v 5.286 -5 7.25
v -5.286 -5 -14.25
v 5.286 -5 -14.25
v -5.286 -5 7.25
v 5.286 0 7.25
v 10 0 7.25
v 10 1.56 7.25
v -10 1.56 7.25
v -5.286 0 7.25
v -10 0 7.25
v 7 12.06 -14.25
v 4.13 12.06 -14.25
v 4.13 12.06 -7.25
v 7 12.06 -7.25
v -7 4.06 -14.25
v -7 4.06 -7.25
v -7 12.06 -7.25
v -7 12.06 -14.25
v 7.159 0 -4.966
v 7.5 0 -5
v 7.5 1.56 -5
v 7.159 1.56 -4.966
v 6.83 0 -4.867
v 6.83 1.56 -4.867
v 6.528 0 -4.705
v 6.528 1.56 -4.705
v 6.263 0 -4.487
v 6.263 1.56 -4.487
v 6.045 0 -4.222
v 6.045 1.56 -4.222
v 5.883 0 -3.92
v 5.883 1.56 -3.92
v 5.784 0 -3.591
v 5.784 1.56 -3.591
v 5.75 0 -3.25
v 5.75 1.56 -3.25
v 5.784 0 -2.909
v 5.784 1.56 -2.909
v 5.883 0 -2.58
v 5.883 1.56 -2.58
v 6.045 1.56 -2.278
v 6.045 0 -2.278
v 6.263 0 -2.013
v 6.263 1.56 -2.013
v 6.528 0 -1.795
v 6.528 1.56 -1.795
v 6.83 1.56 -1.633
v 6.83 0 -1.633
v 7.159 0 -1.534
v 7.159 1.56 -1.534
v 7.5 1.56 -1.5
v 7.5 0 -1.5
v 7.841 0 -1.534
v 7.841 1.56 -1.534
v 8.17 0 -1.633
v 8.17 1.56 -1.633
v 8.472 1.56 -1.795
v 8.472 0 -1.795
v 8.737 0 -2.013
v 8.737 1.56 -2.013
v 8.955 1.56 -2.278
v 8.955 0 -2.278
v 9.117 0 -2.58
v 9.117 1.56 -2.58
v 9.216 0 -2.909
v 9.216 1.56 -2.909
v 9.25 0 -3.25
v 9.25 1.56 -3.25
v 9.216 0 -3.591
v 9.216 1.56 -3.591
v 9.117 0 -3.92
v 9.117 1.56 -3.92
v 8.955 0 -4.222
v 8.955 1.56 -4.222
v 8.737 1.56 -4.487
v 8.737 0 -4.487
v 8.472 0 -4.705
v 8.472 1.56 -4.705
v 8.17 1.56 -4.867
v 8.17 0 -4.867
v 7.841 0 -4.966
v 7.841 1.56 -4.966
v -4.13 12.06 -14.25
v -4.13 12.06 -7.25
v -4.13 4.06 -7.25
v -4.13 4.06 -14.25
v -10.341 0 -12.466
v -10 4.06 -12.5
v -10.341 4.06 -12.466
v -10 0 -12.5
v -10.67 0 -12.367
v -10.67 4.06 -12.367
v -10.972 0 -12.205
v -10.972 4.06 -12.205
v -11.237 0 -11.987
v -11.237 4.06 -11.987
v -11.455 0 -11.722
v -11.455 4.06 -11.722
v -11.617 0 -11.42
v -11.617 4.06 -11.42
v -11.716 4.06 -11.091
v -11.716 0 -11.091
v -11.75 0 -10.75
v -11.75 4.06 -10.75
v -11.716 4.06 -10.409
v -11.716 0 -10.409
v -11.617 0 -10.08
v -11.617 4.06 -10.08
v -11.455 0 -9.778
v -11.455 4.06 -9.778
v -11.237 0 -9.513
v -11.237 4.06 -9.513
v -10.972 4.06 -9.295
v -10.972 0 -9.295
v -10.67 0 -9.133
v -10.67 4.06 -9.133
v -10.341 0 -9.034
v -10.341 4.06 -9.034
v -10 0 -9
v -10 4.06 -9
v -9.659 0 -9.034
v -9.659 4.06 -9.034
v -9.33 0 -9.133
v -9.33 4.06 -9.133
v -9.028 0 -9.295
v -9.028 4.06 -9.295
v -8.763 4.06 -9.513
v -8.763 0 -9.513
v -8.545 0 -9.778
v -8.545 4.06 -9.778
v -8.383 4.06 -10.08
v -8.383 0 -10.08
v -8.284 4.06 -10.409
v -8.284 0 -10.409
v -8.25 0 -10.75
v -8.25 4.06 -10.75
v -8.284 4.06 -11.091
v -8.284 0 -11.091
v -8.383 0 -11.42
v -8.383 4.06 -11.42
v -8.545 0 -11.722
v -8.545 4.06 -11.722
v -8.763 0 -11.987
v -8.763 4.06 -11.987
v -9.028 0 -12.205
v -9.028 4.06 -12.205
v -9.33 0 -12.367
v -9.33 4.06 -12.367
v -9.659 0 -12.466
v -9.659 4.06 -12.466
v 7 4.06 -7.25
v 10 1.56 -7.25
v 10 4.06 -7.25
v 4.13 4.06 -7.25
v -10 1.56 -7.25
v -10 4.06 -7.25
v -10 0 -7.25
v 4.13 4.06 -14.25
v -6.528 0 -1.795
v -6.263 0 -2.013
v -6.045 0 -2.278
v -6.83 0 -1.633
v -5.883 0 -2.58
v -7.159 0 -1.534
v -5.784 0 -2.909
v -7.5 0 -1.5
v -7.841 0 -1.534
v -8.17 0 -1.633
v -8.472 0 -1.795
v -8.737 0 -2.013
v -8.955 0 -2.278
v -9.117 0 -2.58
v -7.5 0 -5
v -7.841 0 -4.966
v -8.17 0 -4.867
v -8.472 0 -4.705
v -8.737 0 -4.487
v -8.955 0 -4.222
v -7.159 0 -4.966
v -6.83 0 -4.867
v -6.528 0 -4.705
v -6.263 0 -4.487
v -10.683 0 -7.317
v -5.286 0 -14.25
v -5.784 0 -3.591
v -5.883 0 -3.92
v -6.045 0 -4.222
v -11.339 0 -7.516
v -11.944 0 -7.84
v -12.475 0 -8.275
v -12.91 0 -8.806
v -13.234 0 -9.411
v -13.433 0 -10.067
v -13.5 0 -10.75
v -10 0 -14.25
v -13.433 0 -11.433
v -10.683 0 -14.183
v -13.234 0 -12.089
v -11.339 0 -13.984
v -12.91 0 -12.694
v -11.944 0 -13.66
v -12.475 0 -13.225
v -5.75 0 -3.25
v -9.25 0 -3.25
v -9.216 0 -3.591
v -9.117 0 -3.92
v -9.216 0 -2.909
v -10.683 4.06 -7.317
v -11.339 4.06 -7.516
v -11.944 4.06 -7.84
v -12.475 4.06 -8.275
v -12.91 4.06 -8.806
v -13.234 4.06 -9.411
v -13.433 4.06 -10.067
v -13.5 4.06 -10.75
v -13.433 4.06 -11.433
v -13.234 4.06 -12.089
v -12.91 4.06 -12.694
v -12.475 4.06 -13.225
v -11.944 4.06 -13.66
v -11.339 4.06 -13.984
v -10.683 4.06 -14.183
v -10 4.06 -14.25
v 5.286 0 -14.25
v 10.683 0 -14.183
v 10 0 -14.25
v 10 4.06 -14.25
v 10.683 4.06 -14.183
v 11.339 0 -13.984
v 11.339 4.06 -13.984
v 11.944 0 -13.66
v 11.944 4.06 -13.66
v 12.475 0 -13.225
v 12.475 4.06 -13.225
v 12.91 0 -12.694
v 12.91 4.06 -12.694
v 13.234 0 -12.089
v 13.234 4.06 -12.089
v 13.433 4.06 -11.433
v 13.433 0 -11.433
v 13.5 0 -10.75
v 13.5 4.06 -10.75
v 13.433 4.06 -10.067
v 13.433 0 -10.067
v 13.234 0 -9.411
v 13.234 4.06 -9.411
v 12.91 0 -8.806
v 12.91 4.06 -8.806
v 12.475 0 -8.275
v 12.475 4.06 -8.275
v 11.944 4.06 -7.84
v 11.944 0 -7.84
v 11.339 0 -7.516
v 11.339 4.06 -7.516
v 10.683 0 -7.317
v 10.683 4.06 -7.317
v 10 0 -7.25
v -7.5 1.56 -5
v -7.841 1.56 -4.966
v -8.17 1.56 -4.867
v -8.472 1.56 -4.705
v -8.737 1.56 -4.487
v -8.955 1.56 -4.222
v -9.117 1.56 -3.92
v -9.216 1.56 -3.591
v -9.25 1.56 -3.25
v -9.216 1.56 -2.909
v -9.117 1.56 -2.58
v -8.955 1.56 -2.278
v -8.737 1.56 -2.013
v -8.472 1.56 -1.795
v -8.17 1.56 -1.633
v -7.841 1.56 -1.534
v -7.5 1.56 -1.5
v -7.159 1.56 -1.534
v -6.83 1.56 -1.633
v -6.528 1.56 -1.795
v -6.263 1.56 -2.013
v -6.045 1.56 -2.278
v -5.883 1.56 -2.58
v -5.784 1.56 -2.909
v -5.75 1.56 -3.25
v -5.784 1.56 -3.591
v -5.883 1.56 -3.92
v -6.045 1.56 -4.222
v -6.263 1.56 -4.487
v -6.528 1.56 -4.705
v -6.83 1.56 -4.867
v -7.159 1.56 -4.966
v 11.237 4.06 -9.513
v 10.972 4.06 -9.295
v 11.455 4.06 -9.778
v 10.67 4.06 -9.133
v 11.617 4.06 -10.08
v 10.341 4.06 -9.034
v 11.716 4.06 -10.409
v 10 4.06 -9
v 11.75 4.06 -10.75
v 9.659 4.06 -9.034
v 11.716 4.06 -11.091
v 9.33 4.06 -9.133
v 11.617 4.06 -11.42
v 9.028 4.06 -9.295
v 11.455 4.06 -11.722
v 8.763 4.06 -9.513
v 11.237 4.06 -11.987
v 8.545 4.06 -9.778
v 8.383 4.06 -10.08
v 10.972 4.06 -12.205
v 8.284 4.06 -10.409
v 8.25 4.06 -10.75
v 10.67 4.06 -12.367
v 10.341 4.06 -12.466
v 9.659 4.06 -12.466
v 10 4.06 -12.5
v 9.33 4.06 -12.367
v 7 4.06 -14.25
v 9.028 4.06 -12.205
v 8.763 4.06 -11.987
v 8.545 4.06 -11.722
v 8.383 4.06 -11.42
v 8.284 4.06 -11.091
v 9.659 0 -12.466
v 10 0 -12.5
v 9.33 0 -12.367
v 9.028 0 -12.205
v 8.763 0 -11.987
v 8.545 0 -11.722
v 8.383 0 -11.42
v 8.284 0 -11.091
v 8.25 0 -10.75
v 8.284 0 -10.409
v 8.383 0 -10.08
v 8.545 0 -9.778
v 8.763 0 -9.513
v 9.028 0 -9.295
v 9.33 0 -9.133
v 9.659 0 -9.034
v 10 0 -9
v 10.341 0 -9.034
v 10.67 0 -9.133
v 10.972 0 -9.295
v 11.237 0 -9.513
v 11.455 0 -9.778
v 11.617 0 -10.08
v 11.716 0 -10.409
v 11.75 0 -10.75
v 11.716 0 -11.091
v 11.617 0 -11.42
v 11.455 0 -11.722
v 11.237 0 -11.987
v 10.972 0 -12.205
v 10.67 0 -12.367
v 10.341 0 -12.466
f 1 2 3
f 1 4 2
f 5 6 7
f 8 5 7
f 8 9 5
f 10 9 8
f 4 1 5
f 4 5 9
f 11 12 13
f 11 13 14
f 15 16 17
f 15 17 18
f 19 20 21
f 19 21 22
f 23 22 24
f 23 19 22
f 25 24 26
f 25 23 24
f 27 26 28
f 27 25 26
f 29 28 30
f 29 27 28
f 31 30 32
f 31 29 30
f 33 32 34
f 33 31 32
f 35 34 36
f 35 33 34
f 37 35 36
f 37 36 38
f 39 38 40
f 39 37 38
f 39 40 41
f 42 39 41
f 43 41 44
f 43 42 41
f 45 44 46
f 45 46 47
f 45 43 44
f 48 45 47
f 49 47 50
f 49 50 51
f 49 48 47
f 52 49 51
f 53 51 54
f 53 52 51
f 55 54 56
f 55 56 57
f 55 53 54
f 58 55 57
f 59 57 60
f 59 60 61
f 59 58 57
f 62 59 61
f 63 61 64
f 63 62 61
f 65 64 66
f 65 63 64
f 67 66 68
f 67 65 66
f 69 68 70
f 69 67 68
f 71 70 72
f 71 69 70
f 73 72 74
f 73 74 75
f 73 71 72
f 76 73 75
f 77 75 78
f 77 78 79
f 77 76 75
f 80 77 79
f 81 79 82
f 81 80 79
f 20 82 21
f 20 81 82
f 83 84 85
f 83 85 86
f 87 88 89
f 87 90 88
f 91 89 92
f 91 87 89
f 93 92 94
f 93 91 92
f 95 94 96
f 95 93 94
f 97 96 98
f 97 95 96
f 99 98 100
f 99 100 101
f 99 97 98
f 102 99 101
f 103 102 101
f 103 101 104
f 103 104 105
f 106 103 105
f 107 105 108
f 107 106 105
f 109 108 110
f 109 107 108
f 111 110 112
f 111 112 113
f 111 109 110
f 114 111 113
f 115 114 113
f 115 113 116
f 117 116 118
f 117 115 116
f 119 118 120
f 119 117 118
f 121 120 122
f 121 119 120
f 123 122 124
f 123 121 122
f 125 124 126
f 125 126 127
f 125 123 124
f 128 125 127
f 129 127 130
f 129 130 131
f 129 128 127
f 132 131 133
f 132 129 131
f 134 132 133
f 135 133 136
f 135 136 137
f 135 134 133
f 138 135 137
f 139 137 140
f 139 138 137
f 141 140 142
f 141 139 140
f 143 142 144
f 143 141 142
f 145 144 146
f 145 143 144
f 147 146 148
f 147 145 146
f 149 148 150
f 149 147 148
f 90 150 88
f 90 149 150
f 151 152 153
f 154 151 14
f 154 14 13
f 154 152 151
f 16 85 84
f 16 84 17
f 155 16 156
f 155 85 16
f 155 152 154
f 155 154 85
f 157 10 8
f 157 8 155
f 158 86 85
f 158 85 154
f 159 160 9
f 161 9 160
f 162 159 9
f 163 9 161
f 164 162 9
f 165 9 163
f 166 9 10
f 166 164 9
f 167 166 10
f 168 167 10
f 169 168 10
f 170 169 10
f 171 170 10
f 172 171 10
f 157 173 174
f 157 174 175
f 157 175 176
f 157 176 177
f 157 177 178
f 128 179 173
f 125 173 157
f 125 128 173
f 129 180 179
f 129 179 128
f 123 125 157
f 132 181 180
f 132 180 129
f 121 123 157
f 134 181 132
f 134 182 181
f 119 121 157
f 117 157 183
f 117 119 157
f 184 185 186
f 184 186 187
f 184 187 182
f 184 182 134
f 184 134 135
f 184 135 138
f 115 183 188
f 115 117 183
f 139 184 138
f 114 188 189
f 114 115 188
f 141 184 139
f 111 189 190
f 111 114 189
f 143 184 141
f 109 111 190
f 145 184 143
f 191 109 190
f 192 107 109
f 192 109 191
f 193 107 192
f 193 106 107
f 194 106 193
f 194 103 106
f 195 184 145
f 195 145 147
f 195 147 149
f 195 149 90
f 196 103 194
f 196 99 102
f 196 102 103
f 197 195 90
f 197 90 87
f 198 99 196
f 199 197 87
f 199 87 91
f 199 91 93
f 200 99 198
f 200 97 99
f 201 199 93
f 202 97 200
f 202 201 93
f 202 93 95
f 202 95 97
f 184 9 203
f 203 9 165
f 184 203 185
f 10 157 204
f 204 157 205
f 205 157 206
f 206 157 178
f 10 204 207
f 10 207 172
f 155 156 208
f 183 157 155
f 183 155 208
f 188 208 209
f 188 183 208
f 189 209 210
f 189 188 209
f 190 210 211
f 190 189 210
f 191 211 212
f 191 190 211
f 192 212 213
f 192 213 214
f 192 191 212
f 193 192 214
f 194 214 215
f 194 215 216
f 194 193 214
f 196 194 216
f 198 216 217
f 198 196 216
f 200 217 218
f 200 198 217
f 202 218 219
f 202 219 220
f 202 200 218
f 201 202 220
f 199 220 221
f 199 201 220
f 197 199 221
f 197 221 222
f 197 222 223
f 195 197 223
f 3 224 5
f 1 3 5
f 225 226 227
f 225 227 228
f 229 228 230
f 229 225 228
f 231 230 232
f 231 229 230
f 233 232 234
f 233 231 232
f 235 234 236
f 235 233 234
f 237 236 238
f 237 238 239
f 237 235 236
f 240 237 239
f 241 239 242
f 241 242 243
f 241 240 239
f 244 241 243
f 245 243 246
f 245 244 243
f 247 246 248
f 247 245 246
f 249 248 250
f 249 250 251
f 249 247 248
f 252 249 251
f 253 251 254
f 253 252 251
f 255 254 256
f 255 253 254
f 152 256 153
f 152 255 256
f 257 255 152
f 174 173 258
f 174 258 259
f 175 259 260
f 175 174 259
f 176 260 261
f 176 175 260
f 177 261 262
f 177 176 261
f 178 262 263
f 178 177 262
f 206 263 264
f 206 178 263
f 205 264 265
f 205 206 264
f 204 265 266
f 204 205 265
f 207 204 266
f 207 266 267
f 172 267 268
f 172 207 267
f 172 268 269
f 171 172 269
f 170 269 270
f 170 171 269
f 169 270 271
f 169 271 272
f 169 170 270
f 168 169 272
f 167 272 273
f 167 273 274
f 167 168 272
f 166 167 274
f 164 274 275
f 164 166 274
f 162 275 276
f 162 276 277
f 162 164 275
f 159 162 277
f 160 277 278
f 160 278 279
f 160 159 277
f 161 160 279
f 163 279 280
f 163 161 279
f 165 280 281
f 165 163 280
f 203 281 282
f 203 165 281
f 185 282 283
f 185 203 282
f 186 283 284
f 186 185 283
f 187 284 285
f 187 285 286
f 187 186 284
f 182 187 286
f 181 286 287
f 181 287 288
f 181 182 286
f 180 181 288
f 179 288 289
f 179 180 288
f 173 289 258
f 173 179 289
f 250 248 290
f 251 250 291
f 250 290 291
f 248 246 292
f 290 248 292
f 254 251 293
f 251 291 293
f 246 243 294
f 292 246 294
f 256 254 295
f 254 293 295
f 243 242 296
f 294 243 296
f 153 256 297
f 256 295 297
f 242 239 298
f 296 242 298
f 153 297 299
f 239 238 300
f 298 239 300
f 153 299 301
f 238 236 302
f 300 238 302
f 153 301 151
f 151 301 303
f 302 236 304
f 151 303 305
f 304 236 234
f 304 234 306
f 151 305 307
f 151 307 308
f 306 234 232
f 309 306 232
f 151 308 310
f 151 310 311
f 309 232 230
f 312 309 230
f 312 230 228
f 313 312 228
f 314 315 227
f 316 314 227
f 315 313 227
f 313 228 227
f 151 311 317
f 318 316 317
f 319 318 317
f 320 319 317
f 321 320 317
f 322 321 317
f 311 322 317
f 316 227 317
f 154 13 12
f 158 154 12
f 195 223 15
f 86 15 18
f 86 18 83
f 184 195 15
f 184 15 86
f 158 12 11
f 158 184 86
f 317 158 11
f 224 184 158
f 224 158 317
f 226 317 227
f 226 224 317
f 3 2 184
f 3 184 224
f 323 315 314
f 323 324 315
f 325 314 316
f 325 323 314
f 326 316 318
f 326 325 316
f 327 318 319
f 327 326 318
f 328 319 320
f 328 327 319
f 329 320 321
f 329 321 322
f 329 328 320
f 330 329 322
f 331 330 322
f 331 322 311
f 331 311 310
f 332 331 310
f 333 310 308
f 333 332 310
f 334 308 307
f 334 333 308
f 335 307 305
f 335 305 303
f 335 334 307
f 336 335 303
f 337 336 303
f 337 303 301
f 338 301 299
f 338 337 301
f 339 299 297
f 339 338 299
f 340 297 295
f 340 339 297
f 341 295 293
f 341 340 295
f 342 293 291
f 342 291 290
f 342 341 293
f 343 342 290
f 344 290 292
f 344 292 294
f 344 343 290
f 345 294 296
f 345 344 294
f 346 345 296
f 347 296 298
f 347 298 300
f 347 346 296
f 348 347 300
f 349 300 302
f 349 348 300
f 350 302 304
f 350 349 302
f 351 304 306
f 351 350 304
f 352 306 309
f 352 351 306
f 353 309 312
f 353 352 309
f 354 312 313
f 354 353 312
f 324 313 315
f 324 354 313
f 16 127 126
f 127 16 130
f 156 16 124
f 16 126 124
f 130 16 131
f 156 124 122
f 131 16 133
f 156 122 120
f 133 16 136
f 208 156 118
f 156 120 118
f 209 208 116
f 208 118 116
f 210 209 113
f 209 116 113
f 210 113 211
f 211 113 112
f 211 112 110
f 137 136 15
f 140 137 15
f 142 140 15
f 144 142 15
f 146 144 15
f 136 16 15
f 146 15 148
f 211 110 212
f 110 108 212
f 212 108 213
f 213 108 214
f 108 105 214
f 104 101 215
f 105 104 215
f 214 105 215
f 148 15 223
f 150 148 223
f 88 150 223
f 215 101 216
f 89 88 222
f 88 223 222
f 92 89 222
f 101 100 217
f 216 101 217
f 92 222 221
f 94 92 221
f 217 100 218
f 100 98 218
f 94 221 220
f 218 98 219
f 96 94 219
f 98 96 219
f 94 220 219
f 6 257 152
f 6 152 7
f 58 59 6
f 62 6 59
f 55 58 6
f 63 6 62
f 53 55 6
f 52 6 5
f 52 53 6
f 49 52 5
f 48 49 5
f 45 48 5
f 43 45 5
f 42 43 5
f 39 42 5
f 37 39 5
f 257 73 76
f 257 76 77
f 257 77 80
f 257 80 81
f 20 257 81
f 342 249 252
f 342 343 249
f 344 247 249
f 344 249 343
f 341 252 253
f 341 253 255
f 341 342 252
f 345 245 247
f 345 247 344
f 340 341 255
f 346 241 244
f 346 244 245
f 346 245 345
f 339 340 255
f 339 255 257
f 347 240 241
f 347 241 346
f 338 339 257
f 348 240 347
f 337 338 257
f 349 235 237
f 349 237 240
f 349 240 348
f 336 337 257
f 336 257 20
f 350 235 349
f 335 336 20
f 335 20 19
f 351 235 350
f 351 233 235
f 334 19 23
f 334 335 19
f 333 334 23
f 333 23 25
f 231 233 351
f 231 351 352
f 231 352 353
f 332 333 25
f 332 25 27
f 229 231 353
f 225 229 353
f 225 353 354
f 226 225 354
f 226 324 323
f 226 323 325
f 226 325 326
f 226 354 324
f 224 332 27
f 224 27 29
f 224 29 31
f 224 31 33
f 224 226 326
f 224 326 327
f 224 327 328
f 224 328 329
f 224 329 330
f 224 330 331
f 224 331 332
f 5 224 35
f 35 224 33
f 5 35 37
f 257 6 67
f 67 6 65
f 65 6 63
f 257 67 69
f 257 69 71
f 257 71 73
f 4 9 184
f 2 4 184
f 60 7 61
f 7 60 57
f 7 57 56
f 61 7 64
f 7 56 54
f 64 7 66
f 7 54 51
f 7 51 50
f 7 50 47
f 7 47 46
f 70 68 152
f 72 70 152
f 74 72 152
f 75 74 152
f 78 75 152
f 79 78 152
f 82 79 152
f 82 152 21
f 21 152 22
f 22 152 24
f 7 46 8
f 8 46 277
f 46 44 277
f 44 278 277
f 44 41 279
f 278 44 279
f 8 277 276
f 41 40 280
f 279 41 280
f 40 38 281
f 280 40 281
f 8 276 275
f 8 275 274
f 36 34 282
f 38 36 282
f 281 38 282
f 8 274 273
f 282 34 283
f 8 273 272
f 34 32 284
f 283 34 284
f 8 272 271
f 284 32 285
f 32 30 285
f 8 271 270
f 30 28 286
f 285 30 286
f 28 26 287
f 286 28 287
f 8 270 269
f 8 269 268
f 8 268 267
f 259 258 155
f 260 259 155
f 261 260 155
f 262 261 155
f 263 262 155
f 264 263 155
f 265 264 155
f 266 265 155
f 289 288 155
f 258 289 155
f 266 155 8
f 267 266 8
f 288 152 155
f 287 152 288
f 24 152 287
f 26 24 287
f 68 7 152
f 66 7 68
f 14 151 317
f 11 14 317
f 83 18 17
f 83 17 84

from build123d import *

# Parameters (mm, degrees)
SKETCH1_R           = 1.75
BOSS_EXTRUDE1_DEPTH = 1.56
SKETCH2_R           = 1.75
BOSS_EXTRUDE2_DEPTH = 2.5
SKETCH3_W           = 14
SKETCH3_H           = 7
BOSS_EXTRUDE3_DEPTH = 8
SKETCH4_W           = 8.26
SKETCH4_H           = 7
CUT_EXTRUDE1_DEPTH  = 8
BOSS_EXTRUDE4_DEPTH = 5


with BuildPart() as part:
    # Sketch1 → Boss-Extrude1 (new body)
    with BuildSketch(Plane(origin=(0, 0, 0), x_dir=(1, 0, 0), z_dir=(0, 1, 0))):
        with BuildLine():
            Line((-10, 14.25), (10, 14.25))
            ThreePointArc((10, 14.25), (13.5, 10.75), (10, 7.25))
            Line((10, 7.25), (10, -7.25))
            Line((10, -7.25), (-10, -7.25))
            Line((-10, -7.25), (-10, 7.25))
            ThreePointArc((-10, 7.25), (-13.5, 10.75), (-10, 14.25))
        make_face()
        with Locations(Location((-10, 10.75, 0), (0, 0, 90))):
            Circle(SKETCH1_R, mode=Mode.SUBTRACT)
        with Locations(Location((10, 10.75, 0), (0, 0, 90))):
            Circle(SKETCH1_R, mode=Mode.SUBTRACT)
        with Locations(Location((-7.5, 3.25, 0), (0, 0, 90))):
            Circle(SKETCH1_R, mode=Mode.SUBTRACT)
        with Locations(Location((7.5, 3.25, 0), (0, 0, 90))):
            Circle(SKETCH1_R, mode=Mode.SUBTRACT)
    extrude(amount=BOSS_EXTRUDE1_DEPTH)

    # Sketch2 → Boss-Extrude2 (add)
    with BuildSketch(Plane(origin=(0, 1.56, 0), x_dir=(1, 0, 0), z_dir=(0, 1, 0))):
        with BuildLine():
            Line((-10, 14.25), (10, 14.25))
            ThreePointArc((10, 14.25), (13.5, 10.75), (10, 7.25))
            Line((10, 7.25), (-10, 7.25))
            ThreePointArc((-10, 7.25), (-13.5, 10.75), (-10, 14.25))
        make_face()
        with Locations(Location((-10, 10.75, 0), (0, 0, 90))):
            Circle(SKETCH2_R, mode=Mode.SUBTRACT)
        with Locations(Location((10, 10.75, 0), (0, 0, 90))):
            Circle(SKETCH2_R, mode=Mode.SUBTRACT)
    extrude(amount=BOSS_EXTRUDE2_DEPTH)

    # Sketch3 → Boss-Extrude3 (add)
    with BuildSketch(Plane(origin=(0, 4.06, 0), x_dir=(1, 0, 0), z_dir=(0, 1, 0))):
        with Locations((0, 10.75)):
            Rectangle(SKETCH3_W, SKETCH3_H)
    extrude(amount=BOSS_EXTRUDE3_DEPTH)

    # Sketch4 → Cut-Extrude1 (cut)
    with BuildSketch(Plane(origin=(0, 12.06, 0), x_dir=(1, 0, 0), z_dir=(0, 1, 0))):
        with Locations((0, 10.75)):
            Rectangle(SKETCH4_W, SKETCH4_H)
    extrude(amount=-CUT_EXTRUDE1_DEPTH, mode=Mode.SUBTRACT)

    # Sketch5 → Boss-Extrude4 (add)
    with BuildSketch(Plane.XZ):
        Polygon((-5.285984698, -7.25), (-5.285984698, -14.25), (5.285984698, -14.25), (5.285984698, -7.25), (5.285984698, 7.25), (-5.285984698, 7.25), align=None)
    extrude(amount=BOSS_EXTRUDE4_DEPTH)


solid = part.part
